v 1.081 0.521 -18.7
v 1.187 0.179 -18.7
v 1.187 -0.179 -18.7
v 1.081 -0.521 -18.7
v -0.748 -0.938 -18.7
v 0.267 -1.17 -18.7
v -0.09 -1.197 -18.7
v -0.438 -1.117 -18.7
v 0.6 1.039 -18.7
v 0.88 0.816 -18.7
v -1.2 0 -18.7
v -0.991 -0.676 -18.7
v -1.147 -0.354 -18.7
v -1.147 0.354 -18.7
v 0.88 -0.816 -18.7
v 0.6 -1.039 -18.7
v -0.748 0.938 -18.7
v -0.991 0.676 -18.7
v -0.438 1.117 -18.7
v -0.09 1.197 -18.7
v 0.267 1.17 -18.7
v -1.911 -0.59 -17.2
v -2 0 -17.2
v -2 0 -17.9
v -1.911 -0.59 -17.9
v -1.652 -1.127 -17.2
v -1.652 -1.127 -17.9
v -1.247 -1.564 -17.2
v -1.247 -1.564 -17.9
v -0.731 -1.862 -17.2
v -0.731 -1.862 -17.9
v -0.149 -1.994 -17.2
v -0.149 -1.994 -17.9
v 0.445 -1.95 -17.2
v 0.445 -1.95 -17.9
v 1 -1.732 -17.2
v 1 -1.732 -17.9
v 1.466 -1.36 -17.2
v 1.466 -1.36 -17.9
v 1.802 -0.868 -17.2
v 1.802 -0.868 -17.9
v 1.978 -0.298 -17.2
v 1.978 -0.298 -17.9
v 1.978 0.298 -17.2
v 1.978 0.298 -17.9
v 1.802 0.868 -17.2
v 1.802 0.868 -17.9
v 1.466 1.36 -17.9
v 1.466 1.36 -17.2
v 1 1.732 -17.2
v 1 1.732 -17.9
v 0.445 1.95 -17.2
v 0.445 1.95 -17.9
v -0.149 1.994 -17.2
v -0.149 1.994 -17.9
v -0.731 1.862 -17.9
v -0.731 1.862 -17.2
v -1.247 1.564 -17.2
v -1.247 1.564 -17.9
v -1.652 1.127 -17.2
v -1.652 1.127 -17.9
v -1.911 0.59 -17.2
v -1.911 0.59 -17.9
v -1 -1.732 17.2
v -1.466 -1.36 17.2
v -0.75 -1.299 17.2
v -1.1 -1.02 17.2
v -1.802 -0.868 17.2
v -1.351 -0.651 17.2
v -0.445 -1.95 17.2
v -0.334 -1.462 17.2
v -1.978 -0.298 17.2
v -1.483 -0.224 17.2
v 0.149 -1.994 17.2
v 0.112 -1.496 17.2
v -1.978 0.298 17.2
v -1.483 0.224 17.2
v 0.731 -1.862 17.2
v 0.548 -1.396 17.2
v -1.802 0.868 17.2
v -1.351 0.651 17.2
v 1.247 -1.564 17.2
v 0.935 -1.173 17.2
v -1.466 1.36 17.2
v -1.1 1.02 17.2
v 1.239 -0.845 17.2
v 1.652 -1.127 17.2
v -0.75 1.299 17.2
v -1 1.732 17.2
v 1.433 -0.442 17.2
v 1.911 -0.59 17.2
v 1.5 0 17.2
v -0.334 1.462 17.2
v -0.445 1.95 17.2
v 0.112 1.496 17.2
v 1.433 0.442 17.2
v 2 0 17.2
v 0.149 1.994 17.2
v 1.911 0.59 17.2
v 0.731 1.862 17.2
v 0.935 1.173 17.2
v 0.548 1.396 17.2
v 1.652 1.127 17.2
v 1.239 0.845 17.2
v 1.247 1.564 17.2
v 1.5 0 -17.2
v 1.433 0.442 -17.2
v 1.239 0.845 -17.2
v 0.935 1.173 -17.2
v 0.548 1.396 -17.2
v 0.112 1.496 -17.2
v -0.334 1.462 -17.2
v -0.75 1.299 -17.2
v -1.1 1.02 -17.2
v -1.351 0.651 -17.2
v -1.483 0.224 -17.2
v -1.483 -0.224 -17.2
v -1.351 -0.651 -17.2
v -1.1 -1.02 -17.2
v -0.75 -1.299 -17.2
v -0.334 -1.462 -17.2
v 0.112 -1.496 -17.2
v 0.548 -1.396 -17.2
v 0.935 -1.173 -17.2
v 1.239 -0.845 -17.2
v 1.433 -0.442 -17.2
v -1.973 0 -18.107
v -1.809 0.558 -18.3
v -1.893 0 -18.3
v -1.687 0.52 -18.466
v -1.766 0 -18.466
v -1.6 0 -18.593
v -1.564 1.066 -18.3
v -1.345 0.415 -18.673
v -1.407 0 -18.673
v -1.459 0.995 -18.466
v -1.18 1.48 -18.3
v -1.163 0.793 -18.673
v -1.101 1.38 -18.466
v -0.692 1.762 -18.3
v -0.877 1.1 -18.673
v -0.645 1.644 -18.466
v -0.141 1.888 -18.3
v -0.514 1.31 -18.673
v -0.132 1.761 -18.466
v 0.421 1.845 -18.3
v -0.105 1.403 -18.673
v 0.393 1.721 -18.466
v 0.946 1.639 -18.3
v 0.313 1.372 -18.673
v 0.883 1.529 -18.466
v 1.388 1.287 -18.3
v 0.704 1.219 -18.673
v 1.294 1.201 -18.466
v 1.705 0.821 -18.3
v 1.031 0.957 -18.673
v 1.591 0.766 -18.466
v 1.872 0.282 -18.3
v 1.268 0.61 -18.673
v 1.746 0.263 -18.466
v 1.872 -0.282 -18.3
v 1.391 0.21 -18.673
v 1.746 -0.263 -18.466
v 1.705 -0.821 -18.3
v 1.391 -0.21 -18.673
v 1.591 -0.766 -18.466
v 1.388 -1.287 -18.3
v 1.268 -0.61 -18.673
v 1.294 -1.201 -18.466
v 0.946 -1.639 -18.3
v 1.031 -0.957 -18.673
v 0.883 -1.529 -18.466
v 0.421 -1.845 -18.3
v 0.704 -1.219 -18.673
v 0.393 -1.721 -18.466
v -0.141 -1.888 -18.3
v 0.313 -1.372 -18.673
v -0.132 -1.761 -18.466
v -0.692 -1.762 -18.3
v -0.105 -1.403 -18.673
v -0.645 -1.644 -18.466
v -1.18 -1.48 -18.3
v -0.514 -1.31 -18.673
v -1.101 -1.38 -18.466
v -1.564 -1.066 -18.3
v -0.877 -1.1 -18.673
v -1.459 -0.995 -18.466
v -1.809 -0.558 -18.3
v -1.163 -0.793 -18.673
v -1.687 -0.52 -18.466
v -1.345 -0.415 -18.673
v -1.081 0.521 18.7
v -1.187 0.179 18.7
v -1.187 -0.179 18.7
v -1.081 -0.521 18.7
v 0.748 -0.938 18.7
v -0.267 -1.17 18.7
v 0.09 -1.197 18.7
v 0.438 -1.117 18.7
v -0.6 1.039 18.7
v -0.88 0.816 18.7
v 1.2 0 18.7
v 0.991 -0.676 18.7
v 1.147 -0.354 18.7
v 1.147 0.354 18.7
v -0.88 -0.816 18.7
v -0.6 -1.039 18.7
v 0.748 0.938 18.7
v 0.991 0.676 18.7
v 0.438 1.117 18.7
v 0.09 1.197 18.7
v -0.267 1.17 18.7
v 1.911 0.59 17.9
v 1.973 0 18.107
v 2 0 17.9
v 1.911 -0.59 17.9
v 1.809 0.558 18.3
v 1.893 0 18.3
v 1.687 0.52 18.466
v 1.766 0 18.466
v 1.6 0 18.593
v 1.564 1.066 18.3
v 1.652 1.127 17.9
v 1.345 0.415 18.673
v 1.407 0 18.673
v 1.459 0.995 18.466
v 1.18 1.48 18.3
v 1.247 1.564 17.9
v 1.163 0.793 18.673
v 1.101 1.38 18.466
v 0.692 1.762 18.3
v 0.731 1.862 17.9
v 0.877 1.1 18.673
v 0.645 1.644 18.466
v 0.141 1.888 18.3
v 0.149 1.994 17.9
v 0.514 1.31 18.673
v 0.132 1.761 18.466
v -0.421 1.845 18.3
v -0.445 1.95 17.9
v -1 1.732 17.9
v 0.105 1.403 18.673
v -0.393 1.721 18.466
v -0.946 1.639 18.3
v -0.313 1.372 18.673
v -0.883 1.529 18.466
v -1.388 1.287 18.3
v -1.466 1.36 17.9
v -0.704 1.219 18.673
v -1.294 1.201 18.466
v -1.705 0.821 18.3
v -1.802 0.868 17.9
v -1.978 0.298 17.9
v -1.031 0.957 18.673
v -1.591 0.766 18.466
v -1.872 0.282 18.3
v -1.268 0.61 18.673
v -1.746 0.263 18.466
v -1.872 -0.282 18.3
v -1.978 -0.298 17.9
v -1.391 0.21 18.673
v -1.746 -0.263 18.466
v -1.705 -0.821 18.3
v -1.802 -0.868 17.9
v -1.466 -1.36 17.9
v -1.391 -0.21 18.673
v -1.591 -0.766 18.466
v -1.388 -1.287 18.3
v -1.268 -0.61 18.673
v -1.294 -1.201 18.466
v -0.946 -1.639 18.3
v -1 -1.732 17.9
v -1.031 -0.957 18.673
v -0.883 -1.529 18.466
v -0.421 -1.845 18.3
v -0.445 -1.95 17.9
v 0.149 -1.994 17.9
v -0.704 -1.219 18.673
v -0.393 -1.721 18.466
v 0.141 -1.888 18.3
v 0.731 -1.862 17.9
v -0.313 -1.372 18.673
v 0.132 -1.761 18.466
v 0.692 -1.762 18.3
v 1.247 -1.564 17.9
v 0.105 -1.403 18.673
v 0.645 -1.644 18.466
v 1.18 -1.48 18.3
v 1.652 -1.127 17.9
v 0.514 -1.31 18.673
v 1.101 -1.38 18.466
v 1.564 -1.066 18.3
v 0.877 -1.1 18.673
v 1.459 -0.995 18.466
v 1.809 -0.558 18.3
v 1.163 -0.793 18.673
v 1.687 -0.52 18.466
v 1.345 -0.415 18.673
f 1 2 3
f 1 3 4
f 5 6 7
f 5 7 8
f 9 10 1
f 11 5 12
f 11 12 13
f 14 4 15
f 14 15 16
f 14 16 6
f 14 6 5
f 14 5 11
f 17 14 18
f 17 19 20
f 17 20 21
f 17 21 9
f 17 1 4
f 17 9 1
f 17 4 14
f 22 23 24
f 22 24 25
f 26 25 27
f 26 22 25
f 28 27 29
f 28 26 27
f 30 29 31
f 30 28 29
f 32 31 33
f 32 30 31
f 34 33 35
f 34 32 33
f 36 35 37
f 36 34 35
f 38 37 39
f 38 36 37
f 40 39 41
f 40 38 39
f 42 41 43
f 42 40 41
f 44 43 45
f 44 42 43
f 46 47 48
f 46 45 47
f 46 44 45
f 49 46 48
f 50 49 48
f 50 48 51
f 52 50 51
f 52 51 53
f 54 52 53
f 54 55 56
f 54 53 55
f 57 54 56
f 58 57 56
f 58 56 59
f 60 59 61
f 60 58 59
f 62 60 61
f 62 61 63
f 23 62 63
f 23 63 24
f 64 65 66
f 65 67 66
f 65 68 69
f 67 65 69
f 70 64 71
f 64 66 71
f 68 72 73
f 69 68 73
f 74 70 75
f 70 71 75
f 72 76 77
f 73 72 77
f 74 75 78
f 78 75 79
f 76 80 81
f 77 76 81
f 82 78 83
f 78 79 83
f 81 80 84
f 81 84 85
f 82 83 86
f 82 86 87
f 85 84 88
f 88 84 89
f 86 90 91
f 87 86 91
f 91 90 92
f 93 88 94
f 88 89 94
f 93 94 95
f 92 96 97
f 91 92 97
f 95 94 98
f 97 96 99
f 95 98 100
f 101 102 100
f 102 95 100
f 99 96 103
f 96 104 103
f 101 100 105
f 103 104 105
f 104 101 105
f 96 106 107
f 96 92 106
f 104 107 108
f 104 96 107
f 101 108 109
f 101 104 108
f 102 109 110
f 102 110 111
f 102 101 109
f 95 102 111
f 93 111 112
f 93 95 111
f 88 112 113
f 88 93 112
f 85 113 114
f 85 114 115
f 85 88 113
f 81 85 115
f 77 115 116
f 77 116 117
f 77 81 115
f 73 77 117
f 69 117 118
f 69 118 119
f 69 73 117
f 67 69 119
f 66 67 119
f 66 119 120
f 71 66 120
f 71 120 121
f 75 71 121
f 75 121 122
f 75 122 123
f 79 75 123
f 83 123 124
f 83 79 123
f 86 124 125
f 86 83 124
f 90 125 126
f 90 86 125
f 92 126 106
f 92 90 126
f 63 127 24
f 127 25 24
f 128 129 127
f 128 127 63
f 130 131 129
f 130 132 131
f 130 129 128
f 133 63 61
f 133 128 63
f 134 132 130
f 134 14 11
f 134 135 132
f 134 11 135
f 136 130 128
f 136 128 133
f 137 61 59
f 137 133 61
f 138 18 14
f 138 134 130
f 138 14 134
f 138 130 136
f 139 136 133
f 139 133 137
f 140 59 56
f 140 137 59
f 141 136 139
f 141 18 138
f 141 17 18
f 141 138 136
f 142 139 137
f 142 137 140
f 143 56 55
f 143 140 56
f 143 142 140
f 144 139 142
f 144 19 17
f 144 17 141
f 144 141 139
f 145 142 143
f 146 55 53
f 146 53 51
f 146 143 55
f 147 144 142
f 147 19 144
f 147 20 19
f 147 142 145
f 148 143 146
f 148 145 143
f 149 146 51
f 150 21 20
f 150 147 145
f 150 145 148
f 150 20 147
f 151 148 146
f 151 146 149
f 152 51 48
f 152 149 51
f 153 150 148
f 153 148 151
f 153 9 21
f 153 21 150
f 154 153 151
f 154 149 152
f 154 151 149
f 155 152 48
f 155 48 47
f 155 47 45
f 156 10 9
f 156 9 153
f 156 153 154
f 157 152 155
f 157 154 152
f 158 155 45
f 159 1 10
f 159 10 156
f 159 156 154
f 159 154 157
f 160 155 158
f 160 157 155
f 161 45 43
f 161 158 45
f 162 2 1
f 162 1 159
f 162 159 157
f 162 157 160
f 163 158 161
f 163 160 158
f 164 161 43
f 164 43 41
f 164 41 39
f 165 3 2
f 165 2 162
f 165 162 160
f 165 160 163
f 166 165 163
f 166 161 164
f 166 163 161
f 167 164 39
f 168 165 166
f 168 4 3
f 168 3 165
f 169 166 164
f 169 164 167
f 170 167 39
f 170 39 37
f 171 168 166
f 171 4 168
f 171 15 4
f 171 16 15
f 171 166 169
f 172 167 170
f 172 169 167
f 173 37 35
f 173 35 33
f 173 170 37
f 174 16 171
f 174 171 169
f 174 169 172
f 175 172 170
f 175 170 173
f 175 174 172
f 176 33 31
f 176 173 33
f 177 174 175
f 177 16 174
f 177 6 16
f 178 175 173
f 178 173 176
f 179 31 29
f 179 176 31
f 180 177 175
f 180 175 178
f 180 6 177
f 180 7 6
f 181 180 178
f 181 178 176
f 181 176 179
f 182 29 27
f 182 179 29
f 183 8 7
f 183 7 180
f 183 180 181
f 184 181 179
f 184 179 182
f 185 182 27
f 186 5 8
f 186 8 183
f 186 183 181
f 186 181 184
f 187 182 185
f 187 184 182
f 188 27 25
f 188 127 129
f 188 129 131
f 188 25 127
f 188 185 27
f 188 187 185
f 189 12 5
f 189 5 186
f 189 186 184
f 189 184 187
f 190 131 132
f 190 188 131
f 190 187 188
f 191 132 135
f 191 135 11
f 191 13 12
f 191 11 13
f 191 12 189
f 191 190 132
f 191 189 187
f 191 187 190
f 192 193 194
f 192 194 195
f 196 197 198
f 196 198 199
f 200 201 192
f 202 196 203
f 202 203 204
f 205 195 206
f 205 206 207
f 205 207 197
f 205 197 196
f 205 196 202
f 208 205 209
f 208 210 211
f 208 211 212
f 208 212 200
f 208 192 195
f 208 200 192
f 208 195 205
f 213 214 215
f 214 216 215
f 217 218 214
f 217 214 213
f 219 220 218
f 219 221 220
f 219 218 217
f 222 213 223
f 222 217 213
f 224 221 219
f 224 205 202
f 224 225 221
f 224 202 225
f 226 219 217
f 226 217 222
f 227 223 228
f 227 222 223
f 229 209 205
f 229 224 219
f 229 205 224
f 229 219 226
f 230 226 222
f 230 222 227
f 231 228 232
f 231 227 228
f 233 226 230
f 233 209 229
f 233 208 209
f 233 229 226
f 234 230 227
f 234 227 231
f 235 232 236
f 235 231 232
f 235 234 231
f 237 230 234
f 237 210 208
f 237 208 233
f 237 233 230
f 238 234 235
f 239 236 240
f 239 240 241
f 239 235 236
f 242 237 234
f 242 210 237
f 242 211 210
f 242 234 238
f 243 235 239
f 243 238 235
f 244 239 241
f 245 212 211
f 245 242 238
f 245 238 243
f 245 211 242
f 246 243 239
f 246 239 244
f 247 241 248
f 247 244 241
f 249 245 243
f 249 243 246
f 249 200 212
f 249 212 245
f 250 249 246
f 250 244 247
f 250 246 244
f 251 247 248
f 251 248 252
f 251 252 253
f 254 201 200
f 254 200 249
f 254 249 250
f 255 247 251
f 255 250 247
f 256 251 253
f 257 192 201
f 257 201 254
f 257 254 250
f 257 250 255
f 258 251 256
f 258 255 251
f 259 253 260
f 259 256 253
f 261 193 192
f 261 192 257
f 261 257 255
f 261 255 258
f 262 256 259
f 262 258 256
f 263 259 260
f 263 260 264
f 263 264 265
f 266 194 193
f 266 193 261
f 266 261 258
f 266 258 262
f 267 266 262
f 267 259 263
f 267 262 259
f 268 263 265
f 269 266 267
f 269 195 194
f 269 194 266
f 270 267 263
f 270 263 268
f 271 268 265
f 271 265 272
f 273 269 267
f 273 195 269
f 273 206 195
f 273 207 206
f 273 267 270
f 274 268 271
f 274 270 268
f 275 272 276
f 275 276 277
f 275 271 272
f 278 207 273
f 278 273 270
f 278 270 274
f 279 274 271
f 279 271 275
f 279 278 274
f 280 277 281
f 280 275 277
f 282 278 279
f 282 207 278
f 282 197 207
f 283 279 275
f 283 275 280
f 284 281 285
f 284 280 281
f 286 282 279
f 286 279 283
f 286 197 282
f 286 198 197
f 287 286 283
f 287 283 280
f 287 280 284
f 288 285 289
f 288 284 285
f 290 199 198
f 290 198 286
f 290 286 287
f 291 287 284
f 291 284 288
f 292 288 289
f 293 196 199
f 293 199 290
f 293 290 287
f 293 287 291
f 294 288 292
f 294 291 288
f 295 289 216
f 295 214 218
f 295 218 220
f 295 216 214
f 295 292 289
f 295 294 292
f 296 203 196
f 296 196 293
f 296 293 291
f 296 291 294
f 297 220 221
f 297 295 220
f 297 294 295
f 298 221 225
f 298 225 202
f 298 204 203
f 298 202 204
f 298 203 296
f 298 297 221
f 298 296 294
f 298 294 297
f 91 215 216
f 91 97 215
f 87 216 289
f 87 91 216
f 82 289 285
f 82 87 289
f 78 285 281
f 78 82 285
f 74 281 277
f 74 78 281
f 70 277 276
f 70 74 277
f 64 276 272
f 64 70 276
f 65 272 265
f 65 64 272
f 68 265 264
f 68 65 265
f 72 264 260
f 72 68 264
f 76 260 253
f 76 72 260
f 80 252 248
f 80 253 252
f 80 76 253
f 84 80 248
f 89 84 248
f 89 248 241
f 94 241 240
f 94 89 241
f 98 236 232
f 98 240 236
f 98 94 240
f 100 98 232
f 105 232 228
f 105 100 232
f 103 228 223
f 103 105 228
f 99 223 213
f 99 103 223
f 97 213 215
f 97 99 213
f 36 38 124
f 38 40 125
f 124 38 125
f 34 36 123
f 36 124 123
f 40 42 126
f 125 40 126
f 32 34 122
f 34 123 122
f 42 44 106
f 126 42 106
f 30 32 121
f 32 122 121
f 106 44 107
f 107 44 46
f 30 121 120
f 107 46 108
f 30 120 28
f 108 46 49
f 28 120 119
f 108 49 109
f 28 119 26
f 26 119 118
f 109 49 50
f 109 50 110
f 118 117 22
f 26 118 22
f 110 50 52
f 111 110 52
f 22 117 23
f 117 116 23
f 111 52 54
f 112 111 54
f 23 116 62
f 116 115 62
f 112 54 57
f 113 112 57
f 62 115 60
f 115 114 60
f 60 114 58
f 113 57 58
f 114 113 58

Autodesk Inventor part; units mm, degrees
ref_plane "YZ Plane" through (0, 0, 0) normal (1, 0, 0) x (0, 1, 0)
sketch "Sketch1" plane through (0, 0, 0) normal (0, 0, 1) x (1, 0, 0)
  circle A0 centre (0, 0) radius 1.5
  dimension "d0" = 3
extrude "Extrusion1" add sketch "Sketch1" along normal mid plane 34.4
ref_plane "Work Plane1" through (0, 0, 17.2) normal (0, 0, 1) x (1, 0, 0)
sketch "Sketch2" plane through (0, 0, 17.2) normal (0, 0, 1) x (1, 0, 0)
  circle A0 centre (0, 0) radius 2
  dimension "d4" = 4
extrude "Extrusion2" add sketch "Sketch2" along normal blind 1.5
ref_plane "Work Plane2" through (0, 0, -17.2) normal (0, 0, -1) x (-1, 0, 0)
sketch "Sketch3" plane through (0, 0, -17.2) normal (0, 0, -1) x (-1, 0, 0)
  circle A0 centre (0, 0) radius 2
extrude "Extrusion3" add sketch "Sketch3" along normal blind 1.5
fillet "Fillet1" radius 0.8 2 edges at (-2, 0, 18.7) (2, 0, -18.7)
properties part number "New_Main_Axle"
